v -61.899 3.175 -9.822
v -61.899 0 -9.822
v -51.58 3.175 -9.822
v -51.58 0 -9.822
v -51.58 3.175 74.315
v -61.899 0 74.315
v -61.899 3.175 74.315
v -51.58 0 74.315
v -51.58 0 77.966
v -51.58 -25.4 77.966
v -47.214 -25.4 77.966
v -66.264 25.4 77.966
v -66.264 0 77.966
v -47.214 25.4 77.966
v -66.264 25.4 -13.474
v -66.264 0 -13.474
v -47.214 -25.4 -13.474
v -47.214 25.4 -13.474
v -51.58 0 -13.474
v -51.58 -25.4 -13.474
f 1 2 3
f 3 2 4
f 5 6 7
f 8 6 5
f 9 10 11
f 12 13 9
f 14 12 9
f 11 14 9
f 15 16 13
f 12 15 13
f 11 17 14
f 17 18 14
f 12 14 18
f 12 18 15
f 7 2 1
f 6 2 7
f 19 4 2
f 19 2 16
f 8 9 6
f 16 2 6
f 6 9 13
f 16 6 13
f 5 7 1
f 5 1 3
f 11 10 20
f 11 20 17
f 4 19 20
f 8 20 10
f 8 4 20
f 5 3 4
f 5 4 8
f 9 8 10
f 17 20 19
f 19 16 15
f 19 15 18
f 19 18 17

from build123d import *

# Parameters (mm, degrees)
F0_W     = 10.31875
F0_H     = 84.1375
F1_DEPTH = 1.5875
F2_W     = 19.05
F2_H     = 91.44
F3_DEPTH = 25.4
F4_W     = 10.31875
F4_H     = 84.1375
F5_DEPTH = 4.7625
F6_W     = 4.365625
F6_H     = 91.44
F7_DEPTH = 25.4


with BuildPart() as f1:
    # F0 (on Front) → F1 (new body)
    with BuildSketch(Plane.XZ):
        with Locations((-56.7394390884, 32.2464529891)):
            Rectangle(F0_W, F0_H)
    extrude(amount=F1_DEPTH)

    # F2 (on face) → F3 (join)
    with BuildSketch(Plane(origin=(0, 0, 0), x_dir=(-1, 0, 0), z_dir=(0, 1, 0))):
        with Locations((56.7394390884, 32.2464529891)):
            Rectangle(F2_W, F2_H)
    extrude(amount=F3_DEPTH)

    # F4 (on face) → F5 (cut)
    with BuildSketch(Plane.XZ.offset(1.5875)):
        with Locations((-56.7394390884, 32.2464529891)):
            Rectangle(F4_W, F4_H)
    extrude(amount=-F5_DEPTH, mode=Mode.SUBTRACT)

    # F6 (on face) → F7 (join)
    with BuildSketch(Plane.XZ):
        with Locations((-49.3972515884, 32.2464529891)):
            Rectangle(F6_W, F6_H)
    extrude(amount=F7_DEPTH)


solid = f1.part
